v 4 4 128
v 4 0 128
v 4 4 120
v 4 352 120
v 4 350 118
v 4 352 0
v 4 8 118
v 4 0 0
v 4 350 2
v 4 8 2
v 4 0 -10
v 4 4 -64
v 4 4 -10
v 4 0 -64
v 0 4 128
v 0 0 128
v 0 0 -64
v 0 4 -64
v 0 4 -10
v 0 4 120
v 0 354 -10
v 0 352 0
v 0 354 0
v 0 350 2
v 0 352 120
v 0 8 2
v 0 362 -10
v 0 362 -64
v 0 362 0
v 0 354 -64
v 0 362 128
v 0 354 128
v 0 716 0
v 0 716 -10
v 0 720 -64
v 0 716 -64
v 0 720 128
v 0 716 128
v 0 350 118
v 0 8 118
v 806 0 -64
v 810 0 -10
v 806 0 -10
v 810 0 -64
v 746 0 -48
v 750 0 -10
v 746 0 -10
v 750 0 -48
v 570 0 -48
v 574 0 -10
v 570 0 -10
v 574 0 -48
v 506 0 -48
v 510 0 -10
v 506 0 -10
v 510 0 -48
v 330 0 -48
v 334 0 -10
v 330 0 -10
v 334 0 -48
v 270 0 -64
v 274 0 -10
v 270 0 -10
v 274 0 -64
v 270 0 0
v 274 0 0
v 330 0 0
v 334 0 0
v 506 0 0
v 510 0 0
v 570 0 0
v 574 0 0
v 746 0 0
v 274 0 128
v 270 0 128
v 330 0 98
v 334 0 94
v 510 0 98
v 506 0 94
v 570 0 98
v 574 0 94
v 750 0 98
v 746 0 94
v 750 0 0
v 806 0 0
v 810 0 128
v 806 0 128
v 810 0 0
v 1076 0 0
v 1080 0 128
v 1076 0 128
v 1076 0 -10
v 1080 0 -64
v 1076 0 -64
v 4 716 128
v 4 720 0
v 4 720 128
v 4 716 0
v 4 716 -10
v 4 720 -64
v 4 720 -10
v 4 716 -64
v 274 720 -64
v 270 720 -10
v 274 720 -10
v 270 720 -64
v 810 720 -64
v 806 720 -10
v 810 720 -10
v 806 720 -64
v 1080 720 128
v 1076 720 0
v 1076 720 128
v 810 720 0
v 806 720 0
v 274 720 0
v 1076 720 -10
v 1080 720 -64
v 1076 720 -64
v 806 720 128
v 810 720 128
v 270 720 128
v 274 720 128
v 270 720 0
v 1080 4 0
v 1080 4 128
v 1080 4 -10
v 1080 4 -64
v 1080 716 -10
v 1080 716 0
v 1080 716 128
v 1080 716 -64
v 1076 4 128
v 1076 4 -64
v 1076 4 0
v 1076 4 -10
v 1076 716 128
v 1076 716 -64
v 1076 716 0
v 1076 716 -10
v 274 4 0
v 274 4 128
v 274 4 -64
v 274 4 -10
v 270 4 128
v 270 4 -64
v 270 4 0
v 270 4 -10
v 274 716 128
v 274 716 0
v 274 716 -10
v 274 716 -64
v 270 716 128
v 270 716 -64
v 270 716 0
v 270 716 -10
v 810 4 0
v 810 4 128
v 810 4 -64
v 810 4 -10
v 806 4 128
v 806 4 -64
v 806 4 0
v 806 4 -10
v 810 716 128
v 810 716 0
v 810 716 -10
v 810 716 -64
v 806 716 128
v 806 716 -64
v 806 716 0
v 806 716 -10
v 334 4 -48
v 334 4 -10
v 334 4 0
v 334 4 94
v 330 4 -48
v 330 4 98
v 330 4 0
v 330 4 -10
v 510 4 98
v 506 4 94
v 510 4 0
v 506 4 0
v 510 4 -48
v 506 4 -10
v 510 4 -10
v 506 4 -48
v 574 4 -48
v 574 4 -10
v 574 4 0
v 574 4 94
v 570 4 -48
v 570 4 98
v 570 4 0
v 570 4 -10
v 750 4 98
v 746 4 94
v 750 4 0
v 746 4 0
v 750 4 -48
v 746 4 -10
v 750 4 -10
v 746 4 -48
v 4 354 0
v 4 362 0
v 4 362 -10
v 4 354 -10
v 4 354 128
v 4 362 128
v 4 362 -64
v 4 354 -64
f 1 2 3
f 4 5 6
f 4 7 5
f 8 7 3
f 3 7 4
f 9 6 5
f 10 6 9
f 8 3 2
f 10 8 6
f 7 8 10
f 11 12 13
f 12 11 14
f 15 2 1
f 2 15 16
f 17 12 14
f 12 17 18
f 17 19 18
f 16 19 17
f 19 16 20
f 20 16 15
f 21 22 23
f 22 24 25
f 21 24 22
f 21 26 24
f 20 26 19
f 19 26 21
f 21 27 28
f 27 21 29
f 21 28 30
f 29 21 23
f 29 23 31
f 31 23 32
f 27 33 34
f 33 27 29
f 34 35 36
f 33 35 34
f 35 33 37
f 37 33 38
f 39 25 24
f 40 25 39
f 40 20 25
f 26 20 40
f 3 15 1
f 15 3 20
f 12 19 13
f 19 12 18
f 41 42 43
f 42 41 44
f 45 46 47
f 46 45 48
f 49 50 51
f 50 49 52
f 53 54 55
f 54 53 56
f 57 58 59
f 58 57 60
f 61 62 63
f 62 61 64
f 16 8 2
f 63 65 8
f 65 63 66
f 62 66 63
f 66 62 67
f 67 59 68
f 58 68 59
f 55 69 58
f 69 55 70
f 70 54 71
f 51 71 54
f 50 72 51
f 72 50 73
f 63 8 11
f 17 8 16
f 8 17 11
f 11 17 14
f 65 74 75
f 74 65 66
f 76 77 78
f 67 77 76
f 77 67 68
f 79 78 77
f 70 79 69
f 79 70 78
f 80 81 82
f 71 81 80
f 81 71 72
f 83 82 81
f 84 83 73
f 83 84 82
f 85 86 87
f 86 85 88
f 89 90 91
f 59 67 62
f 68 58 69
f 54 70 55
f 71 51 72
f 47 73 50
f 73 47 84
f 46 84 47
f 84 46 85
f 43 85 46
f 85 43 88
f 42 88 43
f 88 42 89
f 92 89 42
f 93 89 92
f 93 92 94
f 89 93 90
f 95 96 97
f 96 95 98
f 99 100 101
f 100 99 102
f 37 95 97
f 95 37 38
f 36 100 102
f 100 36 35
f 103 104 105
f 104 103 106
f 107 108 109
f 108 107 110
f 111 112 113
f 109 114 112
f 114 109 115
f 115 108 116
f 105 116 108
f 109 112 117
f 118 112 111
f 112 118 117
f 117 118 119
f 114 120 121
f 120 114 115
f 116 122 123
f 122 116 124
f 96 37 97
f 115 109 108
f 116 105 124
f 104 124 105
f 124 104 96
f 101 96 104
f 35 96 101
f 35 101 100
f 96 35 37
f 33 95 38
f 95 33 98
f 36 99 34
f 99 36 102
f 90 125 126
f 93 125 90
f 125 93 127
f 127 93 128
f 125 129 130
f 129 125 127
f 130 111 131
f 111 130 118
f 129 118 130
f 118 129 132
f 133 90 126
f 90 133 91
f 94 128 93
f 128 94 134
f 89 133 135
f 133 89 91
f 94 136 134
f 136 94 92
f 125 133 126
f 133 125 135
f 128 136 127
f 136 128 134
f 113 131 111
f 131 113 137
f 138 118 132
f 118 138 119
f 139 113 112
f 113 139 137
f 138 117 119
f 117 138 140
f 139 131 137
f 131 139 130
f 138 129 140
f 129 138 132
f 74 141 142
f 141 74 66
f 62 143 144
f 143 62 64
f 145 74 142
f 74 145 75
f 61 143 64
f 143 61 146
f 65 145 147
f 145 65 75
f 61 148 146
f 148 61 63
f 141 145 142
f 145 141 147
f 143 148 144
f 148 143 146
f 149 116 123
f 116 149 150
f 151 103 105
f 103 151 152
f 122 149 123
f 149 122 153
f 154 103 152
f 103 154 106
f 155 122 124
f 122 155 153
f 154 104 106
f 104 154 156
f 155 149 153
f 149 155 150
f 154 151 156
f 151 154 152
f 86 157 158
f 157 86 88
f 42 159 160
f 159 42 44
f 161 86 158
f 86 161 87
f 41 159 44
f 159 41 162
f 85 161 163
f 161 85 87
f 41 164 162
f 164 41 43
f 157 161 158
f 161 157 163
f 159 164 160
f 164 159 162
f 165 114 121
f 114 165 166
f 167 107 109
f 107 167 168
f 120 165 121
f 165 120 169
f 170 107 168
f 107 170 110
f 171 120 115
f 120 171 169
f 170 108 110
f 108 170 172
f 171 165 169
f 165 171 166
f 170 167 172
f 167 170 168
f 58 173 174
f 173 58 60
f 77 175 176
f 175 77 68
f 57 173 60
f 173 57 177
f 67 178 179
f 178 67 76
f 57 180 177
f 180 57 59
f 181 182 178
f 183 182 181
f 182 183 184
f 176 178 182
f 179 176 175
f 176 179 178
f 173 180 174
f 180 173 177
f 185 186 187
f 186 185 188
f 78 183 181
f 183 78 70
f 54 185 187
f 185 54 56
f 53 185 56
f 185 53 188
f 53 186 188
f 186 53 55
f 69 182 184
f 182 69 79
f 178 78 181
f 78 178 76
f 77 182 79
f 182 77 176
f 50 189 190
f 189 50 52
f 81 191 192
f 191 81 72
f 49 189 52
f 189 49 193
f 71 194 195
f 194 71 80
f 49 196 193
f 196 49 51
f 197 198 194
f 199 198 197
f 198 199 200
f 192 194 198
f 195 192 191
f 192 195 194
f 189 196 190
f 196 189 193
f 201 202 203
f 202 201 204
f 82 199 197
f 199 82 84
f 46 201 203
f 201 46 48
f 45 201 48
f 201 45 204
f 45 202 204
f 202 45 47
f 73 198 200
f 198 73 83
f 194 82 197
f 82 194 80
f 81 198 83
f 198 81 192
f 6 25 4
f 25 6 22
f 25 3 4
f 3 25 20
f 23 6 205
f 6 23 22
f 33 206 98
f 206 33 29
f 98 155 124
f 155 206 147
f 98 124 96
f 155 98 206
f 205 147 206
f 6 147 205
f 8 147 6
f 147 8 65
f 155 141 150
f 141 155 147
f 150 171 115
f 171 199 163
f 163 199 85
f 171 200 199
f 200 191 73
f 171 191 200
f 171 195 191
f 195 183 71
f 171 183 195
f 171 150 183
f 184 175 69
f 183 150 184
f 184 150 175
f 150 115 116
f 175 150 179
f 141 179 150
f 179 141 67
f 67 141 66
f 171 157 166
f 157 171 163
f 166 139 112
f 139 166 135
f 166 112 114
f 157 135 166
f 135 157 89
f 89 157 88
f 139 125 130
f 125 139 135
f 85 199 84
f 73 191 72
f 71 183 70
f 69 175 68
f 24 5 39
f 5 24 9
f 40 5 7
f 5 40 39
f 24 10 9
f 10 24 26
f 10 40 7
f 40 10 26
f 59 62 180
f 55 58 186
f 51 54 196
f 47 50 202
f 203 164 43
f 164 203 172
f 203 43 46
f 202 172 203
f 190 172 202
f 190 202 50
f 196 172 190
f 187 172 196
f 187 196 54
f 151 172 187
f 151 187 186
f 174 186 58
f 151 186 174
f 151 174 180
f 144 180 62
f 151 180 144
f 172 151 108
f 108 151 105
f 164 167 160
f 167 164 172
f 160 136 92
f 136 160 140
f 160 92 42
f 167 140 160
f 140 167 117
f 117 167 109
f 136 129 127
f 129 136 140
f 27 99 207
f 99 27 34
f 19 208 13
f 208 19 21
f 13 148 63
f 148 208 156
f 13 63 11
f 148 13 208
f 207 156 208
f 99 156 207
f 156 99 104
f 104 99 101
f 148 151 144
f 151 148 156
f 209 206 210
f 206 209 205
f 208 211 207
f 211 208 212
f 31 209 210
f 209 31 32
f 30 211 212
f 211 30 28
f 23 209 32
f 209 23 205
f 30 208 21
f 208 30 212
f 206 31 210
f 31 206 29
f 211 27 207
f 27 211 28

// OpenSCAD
function ft(x) = x*12;
function yd(x) = ft(x)*3;
function in(x) = x;
function cc(x) = x/255;
// foundation dimensions  
FOUNDATION_X = yd(30);
FOUNDATION_Y = yd(20);
FOUNDATION_Z = in(10); 

module vertical_support_beam (l) {
  color("Brown")
  translate([0,0,-1*l/3])
    cube([in(4),in(4),l]);
}

module two_by_four(height) {
  cube([2,4,height]);   
}

module foundation(l,w,h) {
  color("Grey")
  translate([0,0,-1*h])
  cube([l,w,h]);
}

module four_corner_support(x,y,z) {
  for (i=[0:1]) {
    for (j=[0:1]) {
      translate([
        i* (x - in(4)),
        j* (y - in(4)),
        0
      ]) 
      vertical_support_beam(z);
    }
  }   
}

module wall( length, height, depth, intv) {
  color([cc(135), cc(115), cc(23)])
  difference () {
    cube([length, depth, height]);
    translate([2,-0.1,2])
    cube([length - 4, depth+0.2, height - 4]);    
  }
  color([cc(235), cc(200), cc(42)])
    translate([2,0,2])
    two_by_four(height-4);
  
  // 16 has more options 
  interval = (
    (length % 12 == 0)
    || (length % 12 == 4)
    || (length % 12 == 8)
  ) ? 16 : 1000000;
    
  //for(i=[2:intv:length-4]){
  //  color([cc(235), cc(200), cc(42)])
  //  translate([i,0,2])
  //  cube([2,4,height-4]);   
  //}
}

module room( x, y, z) {
//not working -- needs revision 
  for(i=[0:1]){
    for(j=[0:1]){
      wall_length = i!=j ? y : x;
      rotation  = abs(i-j)*90;
      translate([
          0, // i* (x - in(4)),
          j* (y - in(4)),
          0  
        ])
        rotate([0,0,rotation])
        
        translate([in(4),0,0])
        wall( wall_length, z, in(4) );
    }
  }   
}


module doorway(width, height) { 
  vertical_support_beam(height);
  translate([width-4,0,0])
    vertical_support_beam(height);
  
  translate([0,0,height - (height/3) -2])
  cube([width,4,4]);
}

module barn () { 
  // foundation 
  foundation(yd(30),yd(20),in(10));

  // corner supports 
  four_corner_support(FOUNDATION_X, FOUNDATION_Y, ft(16));

  // garage
  garage_x_offset = yd((30-15)/2);
  garage_x = yd(15); 
  translate([garage_x_offset,0,0])
    four_corner_support(garage_x,FOUNDATION_Y, ft(16));
  
  // garage bay 1
  translate([garage_x_offset + yd(5/3),0,0])
    doorway(yd(5), ft(12));
  
  // garage bay 2
  translate([garage_x_offset + yd(5/3)*2 + yd(5),0,0])
    doorway(yd(5), ft(12)); 

  // walls 
  translate([in(4),in(4),0])
  rotate([0,0,90])
    wall(yd(10) - in(12), ft(10), in(4), 18);
  
  translate([0,yd(10) - in(6),0])
    vertical_support_beam(ft(16));
  translate([0,in(4) + yd(10) - in(6), 0])
    vertical_support_beam(ft(16));
    

}

barn();
